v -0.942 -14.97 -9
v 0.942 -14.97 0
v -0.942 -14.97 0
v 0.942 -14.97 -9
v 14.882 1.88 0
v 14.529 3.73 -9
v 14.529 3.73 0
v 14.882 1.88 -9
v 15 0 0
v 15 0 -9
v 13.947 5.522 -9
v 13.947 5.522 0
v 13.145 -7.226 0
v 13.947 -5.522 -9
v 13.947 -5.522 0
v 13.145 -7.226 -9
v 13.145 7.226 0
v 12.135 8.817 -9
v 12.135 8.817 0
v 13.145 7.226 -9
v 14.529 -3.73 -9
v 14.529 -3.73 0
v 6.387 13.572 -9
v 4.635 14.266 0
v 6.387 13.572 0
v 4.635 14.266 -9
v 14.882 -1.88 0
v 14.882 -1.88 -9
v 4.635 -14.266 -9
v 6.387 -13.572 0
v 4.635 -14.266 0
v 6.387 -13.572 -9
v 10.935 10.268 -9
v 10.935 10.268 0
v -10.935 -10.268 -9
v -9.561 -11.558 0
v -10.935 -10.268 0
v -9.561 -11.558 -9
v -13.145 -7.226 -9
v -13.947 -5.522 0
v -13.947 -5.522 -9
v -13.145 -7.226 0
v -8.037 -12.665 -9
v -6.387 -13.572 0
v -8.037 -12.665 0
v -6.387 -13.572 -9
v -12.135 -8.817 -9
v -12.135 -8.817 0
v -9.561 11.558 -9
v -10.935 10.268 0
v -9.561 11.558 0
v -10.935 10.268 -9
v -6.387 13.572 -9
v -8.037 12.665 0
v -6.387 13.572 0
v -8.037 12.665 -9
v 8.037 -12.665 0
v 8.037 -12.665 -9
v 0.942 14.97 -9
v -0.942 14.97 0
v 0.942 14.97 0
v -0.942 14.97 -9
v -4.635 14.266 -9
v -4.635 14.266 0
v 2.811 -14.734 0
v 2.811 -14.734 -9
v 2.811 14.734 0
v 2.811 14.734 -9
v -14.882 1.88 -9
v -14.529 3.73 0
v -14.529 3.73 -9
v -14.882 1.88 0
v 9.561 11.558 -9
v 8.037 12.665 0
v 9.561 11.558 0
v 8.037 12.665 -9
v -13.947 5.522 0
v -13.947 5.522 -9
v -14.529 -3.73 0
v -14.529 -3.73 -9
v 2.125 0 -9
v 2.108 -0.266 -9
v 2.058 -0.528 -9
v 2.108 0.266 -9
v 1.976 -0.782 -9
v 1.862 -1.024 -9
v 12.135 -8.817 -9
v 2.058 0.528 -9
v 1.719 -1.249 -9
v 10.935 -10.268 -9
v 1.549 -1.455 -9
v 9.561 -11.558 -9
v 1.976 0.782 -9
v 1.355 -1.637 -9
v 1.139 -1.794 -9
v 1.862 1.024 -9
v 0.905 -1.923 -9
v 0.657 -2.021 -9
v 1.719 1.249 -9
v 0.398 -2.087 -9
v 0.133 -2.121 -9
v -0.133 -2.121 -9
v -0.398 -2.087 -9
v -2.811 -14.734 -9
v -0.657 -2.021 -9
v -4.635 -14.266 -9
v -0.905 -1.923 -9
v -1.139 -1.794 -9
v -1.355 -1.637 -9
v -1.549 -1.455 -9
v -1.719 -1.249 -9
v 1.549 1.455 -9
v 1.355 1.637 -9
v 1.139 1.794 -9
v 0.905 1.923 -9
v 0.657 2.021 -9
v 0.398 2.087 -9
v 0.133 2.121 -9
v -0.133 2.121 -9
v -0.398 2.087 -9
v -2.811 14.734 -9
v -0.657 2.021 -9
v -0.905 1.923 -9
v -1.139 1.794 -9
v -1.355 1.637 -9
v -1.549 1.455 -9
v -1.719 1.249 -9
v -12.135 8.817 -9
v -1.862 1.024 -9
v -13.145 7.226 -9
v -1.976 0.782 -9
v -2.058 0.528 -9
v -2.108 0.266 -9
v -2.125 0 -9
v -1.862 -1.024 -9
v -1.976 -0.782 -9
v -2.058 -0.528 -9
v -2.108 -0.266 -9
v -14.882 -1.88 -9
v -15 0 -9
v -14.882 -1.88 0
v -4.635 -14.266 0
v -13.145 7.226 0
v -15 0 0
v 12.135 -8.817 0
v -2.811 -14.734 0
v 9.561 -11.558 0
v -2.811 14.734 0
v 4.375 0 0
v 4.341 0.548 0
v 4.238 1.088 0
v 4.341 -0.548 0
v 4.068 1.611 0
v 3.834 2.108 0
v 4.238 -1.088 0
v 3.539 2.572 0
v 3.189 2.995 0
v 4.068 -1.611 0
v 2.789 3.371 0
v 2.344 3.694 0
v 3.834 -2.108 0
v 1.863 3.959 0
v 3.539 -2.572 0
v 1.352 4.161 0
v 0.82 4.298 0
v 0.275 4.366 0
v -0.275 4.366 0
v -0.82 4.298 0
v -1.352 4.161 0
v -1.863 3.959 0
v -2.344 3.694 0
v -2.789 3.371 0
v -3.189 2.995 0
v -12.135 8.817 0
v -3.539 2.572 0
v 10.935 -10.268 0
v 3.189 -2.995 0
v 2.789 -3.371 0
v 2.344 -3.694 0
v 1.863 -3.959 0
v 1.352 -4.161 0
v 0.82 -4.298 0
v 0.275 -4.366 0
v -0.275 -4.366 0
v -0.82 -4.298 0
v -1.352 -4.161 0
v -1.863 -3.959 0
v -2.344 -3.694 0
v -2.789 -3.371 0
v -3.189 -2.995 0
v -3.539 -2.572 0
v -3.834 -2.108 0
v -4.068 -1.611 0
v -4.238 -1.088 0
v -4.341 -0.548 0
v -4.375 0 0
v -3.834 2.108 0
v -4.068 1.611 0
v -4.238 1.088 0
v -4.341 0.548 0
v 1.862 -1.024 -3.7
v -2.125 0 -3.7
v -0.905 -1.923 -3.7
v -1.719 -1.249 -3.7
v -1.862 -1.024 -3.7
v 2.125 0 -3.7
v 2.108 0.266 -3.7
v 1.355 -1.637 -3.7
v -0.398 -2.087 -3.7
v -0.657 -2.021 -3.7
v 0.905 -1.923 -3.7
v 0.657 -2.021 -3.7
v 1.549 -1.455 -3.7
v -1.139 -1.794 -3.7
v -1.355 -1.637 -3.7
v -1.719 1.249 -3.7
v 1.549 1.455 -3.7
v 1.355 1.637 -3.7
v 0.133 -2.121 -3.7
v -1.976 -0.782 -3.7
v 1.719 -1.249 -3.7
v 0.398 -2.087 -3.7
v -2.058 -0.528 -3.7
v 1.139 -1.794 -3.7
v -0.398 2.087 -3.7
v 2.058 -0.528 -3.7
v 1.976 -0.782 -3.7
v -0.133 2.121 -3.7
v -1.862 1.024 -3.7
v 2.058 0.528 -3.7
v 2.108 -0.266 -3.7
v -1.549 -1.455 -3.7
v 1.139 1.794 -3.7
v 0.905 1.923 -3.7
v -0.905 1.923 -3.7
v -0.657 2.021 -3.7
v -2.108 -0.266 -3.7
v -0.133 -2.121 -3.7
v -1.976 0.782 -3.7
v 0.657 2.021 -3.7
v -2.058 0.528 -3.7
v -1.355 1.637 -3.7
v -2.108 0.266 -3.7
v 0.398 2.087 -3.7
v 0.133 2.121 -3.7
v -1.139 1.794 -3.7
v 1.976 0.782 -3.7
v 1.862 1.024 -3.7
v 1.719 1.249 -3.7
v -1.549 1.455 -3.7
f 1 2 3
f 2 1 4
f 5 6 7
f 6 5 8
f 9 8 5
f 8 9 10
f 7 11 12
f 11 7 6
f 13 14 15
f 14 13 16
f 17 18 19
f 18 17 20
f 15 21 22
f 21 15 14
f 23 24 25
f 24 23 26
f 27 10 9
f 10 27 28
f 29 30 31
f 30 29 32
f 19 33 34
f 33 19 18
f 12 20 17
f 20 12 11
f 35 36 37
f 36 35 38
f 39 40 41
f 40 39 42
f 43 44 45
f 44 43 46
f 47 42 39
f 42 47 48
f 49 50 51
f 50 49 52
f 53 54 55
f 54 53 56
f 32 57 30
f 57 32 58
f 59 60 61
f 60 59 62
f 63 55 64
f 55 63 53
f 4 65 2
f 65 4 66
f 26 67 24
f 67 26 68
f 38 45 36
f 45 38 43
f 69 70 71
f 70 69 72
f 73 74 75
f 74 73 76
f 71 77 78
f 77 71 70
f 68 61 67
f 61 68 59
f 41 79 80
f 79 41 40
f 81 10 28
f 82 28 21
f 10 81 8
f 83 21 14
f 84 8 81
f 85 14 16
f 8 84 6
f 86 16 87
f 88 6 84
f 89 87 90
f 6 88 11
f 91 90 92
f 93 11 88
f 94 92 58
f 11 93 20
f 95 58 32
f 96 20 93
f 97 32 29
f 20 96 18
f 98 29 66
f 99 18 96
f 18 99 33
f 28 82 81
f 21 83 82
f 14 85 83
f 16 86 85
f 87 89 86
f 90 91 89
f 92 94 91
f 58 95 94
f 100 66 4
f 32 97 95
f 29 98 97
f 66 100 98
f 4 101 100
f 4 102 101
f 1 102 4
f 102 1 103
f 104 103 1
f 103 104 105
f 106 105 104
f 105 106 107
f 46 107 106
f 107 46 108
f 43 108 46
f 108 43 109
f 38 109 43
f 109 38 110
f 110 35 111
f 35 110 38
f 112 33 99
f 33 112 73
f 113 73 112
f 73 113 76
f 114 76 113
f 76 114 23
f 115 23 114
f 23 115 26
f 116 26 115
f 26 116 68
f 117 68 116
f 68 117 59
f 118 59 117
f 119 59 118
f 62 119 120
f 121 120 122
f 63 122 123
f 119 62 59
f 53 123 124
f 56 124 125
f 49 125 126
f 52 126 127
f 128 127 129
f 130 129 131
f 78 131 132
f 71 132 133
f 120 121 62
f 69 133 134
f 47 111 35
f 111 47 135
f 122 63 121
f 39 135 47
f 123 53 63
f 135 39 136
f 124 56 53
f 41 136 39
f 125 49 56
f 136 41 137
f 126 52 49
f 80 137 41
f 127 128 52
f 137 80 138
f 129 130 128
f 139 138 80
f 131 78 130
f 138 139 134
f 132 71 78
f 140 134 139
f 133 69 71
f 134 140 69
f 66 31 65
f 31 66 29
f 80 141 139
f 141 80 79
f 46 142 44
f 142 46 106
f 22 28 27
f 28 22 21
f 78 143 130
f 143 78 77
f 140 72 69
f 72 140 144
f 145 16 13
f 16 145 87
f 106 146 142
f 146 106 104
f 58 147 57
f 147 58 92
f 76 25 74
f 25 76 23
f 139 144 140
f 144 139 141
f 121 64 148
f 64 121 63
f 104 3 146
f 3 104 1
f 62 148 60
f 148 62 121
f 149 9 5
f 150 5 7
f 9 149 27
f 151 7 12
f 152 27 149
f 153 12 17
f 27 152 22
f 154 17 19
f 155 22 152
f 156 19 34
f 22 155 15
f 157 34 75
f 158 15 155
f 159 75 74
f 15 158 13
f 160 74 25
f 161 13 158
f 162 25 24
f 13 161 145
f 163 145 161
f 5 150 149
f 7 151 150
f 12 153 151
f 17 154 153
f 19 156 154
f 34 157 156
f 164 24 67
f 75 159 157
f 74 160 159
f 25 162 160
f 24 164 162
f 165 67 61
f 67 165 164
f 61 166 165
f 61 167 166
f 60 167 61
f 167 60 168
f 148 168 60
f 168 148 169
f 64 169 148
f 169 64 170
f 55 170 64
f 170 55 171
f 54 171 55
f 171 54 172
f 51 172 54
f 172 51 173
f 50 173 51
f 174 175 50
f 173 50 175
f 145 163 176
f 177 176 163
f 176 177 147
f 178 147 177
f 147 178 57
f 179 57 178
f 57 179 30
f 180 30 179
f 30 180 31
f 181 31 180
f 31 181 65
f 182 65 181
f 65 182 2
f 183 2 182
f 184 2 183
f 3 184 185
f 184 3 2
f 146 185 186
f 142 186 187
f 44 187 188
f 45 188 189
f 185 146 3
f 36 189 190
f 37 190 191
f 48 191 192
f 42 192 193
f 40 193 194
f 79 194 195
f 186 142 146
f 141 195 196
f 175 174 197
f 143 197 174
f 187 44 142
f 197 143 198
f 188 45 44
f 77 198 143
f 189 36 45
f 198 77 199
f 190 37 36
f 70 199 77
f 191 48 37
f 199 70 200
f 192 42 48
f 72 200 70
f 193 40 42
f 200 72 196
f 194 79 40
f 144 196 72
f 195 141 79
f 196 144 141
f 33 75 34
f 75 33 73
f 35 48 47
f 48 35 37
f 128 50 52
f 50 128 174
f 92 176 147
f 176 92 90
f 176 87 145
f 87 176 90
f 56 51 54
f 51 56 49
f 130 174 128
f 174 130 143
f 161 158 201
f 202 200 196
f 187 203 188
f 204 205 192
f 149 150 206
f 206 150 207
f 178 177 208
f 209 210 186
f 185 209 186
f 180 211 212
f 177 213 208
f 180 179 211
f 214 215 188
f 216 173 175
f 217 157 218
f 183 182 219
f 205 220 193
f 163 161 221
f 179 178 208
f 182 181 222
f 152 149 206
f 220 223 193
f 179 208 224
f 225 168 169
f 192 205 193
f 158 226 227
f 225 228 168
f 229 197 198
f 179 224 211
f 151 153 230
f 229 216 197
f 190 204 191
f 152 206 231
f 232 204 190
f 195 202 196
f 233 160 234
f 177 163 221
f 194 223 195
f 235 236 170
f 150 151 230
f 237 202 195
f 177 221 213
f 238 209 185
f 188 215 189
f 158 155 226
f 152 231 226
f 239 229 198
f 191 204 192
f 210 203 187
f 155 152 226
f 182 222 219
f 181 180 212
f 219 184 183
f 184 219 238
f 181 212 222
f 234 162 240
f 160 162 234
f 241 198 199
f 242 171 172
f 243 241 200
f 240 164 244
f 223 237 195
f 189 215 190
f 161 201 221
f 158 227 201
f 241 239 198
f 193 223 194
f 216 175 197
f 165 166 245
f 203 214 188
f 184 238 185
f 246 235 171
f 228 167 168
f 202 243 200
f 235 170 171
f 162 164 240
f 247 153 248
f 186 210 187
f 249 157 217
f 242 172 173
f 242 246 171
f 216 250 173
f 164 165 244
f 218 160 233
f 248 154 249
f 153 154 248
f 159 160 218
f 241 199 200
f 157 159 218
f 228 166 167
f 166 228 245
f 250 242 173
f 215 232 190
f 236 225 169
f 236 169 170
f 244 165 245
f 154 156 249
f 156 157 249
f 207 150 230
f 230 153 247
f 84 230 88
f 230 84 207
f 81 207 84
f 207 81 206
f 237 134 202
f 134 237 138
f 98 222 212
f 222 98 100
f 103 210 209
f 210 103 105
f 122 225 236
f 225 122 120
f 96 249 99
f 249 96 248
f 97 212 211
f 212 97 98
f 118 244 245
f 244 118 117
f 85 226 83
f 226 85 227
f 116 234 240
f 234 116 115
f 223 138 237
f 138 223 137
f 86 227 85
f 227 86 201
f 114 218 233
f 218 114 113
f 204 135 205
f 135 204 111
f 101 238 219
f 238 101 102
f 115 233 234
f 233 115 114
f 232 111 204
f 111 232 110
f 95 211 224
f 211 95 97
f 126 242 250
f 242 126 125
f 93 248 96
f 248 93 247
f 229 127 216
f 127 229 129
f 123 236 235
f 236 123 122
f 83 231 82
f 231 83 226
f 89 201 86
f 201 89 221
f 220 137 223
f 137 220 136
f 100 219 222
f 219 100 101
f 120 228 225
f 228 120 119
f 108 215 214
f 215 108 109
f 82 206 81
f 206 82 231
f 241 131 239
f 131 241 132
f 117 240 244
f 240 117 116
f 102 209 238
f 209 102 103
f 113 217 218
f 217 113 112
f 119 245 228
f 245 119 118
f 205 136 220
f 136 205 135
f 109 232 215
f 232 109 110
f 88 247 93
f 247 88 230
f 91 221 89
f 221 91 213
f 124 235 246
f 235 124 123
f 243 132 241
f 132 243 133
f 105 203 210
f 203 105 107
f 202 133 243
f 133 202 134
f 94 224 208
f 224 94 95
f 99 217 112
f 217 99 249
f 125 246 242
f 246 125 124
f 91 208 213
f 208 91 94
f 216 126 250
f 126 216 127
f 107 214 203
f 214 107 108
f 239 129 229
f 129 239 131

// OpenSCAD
$fn = 50;


difference() {
	union() {
		translate(v = [0, 0, -9.0000000000]) {
			cylinder(h = 9, r = 15.0000000000);
		}
		translate(v = [0, 0, -9.0000000000]) {
			cylinder(h = 9, r = 2.8750000000);
		}
	}
	union() {
		translate(v = [0, 0, 0]) {
			rotate(a = [0, 0, 0]) {
				difference() {
					union() {
						translate(v = [0, 0, -9.0000000000]) {
							cylinder(h = 9, r = 2.0000000000);
						}
						translate(v = [0, 0, -3.7000000000]) {
							cylinder(h = 3.7000000000, r1 = 2.1250000000, r2 = 4.3750000000);
						}
						translate(v = [0, 0, -9.0000000000]) {
							cylinder(h = 9, r = 2.1250000000);
						}
						translate(v = [0, 0, -9.0000000000]) {
							cylinder(h = 9, r = 2.0000000000);
						}
					}
					union();
				}
			}
		}
	}
}
